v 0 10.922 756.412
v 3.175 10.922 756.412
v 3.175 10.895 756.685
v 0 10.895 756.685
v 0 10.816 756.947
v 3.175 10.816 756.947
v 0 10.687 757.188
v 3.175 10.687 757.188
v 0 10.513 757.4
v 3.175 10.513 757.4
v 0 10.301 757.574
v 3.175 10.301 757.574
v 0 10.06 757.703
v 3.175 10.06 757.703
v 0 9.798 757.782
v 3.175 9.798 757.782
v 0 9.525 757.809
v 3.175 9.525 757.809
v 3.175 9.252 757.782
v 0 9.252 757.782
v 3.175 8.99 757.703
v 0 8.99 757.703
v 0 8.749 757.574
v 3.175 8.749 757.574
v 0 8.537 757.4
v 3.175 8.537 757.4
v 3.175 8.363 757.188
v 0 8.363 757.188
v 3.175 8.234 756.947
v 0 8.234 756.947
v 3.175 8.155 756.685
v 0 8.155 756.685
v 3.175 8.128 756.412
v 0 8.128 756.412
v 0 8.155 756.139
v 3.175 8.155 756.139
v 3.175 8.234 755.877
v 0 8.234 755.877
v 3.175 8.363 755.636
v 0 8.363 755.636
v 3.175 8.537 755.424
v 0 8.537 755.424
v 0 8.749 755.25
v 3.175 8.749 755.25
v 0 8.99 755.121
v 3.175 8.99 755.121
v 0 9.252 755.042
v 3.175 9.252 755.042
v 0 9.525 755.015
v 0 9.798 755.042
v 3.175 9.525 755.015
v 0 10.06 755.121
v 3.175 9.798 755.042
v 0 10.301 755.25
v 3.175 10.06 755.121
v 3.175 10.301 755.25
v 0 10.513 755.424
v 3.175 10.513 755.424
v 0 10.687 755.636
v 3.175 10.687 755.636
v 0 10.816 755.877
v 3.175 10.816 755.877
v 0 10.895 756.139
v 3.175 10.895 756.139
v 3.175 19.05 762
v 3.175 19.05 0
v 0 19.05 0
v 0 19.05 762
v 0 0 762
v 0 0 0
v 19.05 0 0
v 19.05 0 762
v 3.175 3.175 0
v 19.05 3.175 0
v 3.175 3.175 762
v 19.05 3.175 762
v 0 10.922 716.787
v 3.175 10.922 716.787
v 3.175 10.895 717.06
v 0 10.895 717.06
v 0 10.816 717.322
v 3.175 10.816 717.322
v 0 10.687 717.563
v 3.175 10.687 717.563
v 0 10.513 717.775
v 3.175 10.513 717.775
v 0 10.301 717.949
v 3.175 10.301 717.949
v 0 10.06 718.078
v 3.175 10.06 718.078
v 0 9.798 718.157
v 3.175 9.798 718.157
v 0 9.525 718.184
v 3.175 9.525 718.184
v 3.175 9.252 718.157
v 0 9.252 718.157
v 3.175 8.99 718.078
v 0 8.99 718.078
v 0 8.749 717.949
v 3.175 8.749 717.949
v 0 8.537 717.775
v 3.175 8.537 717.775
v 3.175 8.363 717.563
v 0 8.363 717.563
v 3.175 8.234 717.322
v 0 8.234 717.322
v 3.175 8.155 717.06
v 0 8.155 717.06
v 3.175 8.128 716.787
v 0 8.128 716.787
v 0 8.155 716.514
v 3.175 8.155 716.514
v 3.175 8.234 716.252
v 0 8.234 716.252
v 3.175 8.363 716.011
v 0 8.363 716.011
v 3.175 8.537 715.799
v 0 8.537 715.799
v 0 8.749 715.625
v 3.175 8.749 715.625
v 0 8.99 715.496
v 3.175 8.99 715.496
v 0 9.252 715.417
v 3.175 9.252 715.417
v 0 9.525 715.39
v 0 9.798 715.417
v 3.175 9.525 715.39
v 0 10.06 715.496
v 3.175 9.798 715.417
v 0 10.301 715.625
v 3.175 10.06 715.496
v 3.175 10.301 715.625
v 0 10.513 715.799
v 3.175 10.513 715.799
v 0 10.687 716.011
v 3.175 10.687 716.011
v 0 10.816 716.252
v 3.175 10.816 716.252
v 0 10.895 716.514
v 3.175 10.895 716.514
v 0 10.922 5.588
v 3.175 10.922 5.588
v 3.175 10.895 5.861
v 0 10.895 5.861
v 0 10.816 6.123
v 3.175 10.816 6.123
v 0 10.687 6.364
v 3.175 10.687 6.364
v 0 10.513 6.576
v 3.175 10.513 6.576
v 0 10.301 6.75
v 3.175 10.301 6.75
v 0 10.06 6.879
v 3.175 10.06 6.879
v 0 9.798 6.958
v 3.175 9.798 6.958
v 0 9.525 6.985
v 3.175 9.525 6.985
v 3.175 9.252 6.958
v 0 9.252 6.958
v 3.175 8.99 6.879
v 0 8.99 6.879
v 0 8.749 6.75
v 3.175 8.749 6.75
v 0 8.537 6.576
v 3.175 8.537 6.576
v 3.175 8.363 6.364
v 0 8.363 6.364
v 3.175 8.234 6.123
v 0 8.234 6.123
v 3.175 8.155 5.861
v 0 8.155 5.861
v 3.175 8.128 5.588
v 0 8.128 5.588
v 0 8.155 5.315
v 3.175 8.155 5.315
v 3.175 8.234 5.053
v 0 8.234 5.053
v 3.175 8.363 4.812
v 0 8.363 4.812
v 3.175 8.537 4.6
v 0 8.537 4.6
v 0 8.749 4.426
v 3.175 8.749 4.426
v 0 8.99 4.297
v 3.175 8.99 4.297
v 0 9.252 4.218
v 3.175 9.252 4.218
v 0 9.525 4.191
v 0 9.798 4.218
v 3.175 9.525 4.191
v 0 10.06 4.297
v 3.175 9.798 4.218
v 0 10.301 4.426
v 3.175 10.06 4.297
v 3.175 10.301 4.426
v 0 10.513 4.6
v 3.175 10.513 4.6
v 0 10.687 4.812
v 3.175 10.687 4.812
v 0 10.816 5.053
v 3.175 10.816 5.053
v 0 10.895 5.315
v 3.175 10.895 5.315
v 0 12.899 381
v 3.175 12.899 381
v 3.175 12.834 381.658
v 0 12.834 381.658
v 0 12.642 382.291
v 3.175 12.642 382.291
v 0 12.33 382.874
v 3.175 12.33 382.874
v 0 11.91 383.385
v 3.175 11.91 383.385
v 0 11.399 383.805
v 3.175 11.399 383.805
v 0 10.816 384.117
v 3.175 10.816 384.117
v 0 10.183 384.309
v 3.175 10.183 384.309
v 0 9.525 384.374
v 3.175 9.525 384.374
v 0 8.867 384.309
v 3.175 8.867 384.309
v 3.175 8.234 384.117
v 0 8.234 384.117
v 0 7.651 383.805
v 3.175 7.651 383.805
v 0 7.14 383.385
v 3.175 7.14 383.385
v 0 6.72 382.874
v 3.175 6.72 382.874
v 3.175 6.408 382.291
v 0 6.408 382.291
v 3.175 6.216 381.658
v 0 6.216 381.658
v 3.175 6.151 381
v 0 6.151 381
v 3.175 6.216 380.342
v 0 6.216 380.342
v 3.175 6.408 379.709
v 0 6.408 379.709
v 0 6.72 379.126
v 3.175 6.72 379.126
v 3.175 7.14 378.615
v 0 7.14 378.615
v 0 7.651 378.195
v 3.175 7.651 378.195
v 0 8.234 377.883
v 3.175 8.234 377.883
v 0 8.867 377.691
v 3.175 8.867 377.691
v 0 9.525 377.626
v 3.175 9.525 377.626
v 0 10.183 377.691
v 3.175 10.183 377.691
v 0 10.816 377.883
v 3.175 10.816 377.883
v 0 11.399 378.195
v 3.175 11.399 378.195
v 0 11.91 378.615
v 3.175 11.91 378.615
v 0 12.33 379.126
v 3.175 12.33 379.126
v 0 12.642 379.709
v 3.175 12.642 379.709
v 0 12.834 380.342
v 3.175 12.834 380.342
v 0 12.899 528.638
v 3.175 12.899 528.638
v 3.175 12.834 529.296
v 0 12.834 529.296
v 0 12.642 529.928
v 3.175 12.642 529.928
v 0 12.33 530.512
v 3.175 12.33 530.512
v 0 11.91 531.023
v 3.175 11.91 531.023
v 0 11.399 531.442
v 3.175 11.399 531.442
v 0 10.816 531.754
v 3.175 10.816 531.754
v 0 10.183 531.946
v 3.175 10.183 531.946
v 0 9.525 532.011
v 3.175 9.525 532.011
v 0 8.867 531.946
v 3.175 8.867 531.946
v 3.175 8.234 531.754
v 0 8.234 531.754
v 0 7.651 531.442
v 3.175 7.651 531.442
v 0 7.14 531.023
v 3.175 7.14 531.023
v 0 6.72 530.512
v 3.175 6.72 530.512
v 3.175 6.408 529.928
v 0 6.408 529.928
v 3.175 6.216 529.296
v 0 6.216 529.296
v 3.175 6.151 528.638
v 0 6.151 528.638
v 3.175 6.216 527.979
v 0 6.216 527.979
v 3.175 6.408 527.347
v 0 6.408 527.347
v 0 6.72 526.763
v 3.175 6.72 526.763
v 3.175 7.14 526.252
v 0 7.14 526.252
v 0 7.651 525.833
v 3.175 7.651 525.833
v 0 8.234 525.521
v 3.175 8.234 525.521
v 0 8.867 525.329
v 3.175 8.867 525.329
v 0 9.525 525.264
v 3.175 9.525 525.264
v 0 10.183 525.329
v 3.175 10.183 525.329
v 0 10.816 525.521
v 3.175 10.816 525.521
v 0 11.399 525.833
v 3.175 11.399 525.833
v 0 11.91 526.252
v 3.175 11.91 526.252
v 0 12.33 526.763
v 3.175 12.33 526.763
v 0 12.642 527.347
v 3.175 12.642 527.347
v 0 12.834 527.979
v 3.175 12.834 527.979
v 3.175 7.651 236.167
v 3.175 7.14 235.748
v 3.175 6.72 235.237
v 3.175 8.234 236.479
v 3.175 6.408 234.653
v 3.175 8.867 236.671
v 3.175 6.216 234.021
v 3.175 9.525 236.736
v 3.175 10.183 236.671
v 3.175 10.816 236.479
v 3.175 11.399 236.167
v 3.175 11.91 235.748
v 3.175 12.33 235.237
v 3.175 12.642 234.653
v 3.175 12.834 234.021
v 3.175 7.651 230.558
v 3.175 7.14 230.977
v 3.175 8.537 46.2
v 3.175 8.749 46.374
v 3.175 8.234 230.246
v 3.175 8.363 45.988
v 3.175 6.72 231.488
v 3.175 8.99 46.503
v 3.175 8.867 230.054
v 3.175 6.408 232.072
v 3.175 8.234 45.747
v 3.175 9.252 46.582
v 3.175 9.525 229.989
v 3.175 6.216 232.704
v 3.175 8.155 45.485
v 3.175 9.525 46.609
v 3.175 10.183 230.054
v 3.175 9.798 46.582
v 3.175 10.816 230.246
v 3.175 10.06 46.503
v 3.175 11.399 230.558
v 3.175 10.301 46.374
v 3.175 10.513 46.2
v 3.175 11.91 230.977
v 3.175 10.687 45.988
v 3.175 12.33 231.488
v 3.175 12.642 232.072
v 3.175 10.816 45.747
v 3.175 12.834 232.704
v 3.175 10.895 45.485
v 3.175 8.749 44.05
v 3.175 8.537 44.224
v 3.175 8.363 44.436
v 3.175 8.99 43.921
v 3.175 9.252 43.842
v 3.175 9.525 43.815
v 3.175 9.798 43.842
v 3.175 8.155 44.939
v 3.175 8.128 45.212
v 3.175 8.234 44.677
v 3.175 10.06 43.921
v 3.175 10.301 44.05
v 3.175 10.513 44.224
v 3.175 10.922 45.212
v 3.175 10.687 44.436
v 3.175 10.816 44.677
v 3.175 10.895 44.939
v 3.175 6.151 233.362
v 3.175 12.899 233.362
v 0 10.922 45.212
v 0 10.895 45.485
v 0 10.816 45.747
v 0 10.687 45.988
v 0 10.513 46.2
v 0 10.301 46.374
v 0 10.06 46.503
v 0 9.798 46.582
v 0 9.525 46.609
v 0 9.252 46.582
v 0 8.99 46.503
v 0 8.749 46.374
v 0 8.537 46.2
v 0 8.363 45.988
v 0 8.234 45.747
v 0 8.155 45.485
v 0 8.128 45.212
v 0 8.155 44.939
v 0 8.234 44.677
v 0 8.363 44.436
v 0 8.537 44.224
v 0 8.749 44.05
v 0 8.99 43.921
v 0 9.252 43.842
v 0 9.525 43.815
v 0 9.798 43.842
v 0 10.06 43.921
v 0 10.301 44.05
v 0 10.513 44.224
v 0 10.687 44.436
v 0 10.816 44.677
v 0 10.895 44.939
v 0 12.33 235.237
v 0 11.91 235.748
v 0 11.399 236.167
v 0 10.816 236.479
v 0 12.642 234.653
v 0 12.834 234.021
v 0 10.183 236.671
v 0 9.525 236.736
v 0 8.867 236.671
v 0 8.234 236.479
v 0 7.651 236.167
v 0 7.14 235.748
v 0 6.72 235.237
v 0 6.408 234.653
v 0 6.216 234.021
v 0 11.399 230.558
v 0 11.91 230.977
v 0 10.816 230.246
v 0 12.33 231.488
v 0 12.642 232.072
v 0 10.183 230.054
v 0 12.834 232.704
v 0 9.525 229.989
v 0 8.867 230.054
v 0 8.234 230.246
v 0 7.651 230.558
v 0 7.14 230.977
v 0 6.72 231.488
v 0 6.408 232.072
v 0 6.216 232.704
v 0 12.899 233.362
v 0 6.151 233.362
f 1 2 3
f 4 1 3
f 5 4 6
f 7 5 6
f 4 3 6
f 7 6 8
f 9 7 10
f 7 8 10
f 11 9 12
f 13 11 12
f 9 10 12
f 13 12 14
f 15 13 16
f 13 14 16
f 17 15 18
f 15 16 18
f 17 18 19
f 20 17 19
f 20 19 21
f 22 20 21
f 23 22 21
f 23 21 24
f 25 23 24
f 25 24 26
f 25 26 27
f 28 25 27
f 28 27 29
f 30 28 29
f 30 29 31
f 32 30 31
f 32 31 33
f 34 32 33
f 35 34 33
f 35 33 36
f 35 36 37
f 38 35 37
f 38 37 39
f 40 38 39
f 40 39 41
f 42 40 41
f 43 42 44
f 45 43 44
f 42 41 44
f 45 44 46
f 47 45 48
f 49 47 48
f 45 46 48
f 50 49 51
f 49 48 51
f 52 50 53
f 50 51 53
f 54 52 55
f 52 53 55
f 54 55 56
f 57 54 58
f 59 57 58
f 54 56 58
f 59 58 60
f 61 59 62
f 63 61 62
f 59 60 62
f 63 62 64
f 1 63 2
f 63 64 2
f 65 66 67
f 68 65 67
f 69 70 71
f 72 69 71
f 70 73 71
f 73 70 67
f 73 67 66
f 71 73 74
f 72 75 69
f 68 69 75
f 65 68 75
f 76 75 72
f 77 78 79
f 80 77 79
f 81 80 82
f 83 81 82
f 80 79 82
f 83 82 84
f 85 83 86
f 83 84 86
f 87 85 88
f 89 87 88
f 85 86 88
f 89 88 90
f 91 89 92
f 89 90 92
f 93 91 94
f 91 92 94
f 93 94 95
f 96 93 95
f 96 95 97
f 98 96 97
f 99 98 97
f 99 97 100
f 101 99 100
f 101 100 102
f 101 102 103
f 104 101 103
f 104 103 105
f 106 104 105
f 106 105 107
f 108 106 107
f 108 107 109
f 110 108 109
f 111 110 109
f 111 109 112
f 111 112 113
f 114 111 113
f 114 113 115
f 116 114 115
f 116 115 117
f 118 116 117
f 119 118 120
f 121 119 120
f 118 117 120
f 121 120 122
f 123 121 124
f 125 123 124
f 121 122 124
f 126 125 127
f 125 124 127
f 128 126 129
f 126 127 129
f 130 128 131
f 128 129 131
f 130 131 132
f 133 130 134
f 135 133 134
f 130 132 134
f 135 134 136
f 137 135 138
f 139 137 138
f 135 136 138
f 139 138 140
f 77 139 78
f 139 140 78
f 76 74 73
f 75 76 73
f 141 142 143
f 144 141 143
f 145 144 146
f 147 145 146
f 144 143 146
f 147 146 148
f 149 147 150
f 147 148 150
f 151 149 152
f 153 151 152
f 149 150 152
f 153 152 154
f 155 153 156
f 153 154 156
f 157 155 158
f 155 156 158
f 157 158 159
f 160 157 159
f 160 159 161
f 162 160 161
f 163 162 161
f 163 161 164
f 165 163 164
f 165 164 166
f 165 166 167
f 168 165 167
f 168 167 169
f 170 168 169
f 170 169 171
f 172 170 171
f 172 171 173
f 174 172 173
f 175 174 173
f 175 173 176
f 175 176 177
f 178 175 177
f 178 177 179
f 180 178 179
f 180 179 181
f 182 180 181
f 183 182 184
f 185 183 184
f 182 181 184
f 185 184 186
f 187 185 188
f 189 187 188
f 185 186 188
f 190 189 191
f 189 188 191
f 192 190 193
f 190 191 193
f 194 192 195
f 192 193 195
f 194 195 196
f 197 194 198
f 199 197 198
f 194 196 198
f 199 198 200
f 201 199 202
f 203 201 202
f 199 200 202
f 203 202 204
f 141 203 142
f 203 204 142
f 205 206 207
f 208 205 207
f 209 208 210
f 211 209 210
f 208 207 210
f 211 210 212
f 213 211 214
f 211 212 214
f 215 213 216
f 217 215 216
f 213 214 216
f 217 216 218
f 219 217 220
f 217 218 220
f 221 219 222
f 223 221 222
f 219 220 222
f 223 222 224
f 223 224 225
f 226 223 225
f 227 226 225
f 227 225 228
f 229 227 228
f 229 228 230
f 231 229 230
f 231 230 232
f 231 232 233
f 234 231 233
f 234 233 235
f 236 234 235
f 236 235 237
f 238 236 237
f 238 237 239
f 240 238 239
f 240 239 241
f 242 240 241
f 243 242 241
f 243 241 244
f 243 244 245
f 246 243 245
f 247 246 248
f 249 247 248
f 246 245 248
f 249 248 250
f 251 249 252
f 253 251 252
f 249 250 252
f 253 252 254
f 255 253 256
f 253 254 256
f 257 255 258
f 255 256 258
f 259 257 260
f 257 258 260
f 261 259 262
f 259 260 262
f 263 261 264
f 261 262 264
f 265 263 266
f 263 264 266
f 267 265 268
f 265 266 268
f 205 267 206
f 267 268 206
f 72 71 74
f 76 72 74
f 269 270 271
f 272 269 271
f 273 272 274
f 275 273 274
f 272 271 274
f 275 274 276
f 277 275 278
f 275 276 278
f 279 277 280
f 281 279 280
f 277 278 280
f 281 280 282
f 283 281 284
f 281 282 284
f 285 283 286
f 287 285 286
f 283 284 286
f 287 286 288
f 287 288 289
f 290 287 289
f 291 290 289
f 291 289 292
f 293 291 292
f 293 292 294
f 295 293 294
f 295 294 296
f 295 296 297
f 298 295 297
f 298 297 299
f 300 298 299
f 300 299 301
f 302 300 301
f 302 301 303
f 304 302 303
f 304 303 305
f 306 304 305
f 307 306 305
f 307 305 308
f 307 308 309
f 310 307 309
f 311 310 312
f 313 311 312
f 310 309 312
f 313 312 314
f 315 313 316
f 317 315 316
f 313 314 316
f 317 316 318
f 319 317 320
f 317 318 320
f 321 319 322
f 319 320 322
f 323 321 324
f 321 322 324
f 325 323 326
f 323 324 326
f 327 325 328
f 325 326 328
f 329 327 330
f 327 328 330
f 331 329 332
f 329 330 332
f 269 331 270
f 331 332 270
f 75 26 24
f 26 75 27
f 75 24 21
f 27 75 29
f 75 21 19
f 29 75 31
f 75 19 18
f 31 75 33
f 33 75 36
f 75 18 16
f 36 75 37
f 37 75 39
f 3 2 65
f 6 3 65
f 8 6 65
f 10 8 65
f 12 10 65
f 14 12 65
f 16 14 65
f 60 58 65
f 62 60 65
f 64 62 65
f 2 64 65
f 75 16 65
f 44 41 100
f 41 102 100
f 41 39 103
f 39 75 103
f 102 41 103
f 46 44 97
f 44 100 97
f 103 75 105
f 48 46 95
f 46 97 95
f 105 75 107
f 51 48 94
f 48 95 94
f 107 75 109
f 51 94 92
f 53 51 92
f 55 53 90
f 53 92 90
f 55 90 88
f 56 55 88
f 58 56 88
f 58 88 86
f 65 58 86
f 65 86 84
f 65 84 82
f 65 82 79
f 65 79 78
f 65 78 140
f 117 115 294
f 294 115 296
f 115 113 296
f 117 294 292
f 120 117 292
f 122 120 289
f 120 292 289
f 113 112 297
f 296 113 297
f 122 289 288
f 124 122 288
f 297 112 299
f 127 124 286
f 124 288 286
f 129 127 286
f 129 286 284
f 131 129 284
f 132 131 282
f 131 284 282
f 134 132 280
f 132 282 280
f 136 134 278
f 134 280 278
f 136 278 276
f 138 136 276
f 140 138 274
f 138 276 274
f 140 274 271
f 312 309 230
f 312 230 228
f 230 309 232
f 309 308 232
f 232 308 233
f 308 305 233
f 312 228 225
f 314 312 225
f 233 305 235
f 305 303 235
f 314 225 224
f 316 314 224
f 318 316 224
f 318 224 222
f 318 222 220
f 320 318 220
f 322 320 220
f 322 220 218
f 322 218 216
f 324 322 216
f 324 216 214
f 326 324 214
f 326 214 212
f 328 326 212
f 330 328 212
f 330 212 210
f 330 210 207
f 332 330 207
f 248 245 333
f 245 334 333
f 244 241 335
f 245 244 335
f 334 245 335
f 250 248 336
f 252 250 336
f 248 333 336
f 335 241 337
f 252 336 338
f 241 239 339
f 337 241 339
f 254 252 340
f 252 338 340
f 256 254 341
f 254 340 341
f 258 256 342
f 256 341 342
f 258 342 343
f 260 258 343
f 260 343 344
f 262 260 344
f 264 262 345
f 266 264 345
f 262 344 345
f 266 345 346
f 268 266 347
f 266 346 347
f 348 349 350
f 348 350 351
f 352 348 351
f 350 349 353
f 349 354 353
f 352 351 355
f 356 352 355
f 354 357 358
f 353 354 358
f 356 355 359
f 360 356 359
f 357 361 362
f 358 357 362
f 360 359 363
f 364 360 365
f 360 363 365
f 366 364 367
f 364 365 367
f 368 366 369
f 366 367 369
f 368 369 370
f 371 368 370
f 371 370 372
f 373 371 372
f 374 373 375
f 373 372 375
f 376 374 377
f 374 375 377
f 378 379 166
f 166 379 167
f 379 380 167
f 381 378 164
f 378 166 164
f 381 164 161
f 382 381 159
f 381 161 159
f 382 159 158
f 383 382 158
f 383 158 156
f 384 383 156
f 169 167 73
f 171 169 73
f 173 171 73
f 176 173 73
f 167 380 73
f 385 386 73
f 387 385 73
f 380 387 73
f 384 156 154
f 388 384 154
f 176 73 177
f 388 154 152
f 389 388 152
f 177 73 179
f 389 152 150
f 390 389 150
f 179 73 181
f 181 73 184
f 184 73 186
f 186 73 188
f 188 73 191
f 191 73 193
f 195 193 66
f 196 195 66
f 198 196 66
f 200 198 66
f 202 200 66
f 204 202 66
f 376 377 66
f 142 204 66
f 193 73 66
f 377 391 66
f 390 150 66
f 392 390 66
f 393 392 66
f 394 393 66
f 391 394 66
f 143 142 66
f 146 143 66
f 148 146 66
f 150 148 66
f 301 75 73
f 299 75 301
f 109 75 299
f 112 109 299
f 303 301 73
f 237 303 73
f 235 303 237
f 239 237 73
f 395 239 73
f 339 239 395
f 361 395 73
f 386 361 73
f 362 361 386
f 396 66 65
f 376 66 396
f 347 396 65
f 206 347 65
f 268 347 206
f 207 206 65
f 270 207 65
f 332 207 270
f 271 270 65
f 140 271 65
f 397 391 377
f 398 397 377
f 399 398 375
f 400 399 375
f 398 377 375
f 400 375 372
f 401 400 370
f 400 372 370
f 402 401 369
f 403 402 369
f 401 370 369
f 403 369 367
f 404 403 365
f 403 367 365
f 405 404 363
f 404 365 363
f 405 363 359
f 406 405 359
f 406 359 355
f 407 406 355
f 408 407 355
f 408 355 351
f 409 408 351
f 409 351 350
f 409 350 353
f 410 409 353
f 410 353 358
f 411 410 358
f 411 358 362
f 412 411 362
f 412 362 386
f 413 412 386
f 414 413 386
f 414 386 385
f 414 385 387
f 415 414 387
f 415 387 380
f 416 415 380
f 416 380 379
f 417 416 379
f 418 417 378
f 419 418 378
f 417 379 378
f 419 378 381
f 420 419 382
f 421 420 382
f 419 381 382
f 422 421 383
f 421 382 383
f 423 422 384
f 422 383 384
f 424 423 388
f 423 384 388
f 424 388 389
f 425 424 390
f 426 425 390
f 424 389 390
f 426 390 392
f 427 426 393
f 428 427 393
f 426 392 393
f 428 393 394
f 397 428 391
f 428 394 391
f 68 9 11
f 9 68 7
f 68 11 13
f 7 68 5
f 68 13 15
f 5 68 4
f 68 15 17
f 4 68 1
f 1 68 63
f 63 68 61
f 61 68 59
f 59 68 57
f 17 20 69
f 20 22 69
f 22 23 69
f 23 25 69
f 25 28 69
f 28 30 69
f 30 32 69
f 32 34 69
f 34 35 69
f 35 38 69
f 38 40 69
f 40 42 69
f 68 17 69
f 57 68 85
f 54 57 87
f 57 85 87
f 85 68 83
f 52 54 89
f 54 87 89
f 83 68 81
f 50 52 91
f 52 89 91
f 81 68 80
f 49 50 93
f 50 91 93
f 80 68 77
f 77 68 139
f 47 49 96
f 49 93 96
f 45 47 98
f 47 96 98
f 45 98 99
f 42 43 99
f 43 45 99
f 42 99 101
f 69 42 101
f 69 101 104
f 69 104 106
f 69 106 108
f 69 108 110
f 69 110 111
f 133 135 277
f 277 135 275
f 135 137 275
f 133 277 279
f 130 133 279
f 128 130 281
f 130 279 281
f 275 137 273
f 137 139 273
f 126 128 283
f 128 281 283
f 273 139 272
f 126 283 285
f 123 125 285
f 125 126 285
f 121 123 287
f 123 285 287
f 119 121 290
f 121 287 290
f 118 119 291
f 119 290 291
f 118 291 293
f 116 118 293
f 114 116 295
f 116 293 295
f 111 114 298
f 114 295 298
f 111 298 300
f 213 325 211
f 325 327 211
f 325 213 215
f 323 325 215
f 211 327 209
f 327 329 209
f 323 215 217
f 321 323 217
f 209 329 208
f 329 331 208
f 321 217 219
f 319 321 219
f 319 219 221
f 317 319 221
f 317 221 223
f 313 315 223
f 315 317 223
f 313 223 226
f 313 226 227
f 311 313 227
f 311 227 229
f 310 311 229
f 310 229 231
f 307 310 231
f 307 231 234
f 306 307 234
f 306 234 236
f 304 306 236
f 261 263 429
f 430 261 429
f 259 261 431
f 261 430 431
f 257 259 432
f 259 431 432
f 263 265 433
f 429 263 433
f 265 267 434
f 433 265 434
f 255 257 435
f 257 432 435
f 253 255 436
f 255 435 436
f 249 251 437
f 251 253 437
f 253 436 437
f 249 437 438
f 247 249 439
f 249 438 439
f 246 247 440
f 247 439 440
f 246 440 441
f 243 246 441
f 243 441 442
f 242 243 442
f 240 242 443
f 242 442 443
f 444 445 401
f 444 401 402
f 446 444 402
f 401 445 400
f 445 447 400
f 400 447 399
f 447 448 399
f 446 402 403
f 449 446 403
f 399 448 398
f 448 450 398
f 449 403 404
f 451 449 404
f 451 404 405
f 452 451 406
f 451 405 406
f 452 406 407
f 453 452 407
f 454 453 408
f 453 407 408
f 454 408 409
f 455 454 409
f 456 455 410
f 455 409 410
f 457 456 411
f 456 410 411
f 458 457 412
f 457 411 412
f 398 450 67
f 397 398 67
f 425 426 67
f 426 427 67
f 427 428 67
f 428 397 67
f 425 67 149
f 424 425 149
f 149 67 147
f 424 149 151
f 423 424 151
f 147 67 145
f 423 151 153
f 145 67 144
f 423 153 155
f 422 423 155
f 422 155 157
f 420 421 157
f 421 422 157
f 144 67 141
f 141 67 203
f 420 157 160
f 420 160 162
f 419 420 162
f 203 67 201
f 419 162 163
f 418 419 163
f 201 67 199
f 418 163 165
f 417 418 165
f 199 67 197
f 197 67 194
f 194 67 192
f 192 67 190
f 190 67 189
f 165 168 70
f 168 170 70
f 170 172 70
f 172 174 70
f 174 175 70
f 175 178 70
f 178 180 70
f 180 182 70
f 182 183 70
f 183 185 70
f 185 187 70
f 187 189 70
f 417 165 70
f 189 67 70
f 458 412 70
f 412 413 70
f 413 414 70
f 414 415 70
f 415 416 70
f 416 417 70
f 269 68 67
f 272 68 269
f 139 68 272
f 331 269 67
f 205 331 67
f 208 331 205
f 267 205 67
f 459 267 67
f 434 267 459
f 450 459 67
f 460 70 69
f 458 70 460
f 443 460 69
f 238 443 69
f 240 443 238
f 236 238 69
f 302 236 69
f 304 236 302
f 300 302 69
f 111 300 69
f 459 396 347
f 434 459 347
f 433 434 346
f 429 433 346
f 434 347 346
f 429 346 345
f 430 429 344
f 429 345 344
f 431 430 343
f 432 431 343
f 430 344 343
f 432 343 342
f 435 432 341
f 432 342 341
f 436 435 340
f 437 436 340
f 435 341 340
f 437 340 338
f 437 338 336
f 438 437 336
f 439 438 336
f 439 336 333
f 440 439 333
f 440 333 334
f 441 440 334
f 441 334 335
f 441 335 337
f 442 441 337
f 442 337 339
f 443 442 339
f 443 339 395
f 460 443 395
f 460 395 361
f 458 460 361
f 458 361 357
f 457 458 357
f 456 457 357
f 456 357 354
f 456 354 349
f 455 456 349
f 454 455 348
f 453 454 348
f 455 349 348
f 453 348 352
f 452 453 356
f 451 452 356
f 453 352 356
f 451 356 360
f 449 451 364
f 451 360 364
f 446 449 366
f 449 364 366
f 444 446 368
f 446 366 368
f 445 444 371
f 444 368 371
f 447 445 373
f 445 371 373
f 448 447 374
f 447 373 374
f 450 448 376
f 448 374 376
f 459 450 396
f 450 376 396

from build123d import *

# Parameters (mm, degrees)
BOSS_EXTRUDE1_DEPTH                  = 762
F_35_0_11_DIAMETER_HOLE1_D           = 2.794
F_17_64_0_26563_DIAMETER_HOLE1_D     = 6.747002
F_17_64_0_26563_DIAMETER_HOLE1_DEPTH = 10
F_17_64_0_26563_DIAMETER_HOLE1_TIP   = 2.027003899


with BuildPart() as part:
    # Sketch1 → Boss-Extrude1 (new body)
    with BuildSketch(Plane.XY):
        Polygon((0, 0), (19.05, 0), (19.05, 3.175), (3.175, 3.175), (3.175, 19.05), (0, 19.05), align=None)
    extrude(amount=BOSS_EXTRUDE1_DEPTH)

    # #35 (0.11) Diameter Hole1 (through all)
    with Locations(Plane(origin=(0, 9.525, 5.588), x_dir=(0, -1, 0), z_dir=(-1, 0, 0))):
        with Locations((0, 0), (0, 39.624), (0, 711.199), (0, 750.824)):
            Hole(F_35_0_11_DIAMETER_HOLE1_D / 2)

    # 17/64 (0.26563) Diameter Hole1
    with Locations(Plane(origin=(0, 9.525, 233.3625), x_dir=(0, -1, 0), z_dir=(-1, 0, 0))):
        with Locations((0, 0), (0, 147.6375), (0, 295.275)):
            Hole(F_17_64_0_26563_DIAMETER_HOLE1_D / 2, depth=F_17_64_0_26563_DIAMETER_HOLE1_DEPTH)
            with Locations((0, 0, -(F_17_64_0_26563_DIAMETER_HOLE1_DEPTH + F_17_64_0_26563_DIAMETER_HOLE1_TIP / 2))):  # 118° drill point
                Cone(0, F_17_64_0_26563_DIAMETER_HOLE1_D / 2, F_17_64_0_26563_DIAMETER_HOLE1_TIP, mode=Mode.SUBTRACT)


solid = part.part
